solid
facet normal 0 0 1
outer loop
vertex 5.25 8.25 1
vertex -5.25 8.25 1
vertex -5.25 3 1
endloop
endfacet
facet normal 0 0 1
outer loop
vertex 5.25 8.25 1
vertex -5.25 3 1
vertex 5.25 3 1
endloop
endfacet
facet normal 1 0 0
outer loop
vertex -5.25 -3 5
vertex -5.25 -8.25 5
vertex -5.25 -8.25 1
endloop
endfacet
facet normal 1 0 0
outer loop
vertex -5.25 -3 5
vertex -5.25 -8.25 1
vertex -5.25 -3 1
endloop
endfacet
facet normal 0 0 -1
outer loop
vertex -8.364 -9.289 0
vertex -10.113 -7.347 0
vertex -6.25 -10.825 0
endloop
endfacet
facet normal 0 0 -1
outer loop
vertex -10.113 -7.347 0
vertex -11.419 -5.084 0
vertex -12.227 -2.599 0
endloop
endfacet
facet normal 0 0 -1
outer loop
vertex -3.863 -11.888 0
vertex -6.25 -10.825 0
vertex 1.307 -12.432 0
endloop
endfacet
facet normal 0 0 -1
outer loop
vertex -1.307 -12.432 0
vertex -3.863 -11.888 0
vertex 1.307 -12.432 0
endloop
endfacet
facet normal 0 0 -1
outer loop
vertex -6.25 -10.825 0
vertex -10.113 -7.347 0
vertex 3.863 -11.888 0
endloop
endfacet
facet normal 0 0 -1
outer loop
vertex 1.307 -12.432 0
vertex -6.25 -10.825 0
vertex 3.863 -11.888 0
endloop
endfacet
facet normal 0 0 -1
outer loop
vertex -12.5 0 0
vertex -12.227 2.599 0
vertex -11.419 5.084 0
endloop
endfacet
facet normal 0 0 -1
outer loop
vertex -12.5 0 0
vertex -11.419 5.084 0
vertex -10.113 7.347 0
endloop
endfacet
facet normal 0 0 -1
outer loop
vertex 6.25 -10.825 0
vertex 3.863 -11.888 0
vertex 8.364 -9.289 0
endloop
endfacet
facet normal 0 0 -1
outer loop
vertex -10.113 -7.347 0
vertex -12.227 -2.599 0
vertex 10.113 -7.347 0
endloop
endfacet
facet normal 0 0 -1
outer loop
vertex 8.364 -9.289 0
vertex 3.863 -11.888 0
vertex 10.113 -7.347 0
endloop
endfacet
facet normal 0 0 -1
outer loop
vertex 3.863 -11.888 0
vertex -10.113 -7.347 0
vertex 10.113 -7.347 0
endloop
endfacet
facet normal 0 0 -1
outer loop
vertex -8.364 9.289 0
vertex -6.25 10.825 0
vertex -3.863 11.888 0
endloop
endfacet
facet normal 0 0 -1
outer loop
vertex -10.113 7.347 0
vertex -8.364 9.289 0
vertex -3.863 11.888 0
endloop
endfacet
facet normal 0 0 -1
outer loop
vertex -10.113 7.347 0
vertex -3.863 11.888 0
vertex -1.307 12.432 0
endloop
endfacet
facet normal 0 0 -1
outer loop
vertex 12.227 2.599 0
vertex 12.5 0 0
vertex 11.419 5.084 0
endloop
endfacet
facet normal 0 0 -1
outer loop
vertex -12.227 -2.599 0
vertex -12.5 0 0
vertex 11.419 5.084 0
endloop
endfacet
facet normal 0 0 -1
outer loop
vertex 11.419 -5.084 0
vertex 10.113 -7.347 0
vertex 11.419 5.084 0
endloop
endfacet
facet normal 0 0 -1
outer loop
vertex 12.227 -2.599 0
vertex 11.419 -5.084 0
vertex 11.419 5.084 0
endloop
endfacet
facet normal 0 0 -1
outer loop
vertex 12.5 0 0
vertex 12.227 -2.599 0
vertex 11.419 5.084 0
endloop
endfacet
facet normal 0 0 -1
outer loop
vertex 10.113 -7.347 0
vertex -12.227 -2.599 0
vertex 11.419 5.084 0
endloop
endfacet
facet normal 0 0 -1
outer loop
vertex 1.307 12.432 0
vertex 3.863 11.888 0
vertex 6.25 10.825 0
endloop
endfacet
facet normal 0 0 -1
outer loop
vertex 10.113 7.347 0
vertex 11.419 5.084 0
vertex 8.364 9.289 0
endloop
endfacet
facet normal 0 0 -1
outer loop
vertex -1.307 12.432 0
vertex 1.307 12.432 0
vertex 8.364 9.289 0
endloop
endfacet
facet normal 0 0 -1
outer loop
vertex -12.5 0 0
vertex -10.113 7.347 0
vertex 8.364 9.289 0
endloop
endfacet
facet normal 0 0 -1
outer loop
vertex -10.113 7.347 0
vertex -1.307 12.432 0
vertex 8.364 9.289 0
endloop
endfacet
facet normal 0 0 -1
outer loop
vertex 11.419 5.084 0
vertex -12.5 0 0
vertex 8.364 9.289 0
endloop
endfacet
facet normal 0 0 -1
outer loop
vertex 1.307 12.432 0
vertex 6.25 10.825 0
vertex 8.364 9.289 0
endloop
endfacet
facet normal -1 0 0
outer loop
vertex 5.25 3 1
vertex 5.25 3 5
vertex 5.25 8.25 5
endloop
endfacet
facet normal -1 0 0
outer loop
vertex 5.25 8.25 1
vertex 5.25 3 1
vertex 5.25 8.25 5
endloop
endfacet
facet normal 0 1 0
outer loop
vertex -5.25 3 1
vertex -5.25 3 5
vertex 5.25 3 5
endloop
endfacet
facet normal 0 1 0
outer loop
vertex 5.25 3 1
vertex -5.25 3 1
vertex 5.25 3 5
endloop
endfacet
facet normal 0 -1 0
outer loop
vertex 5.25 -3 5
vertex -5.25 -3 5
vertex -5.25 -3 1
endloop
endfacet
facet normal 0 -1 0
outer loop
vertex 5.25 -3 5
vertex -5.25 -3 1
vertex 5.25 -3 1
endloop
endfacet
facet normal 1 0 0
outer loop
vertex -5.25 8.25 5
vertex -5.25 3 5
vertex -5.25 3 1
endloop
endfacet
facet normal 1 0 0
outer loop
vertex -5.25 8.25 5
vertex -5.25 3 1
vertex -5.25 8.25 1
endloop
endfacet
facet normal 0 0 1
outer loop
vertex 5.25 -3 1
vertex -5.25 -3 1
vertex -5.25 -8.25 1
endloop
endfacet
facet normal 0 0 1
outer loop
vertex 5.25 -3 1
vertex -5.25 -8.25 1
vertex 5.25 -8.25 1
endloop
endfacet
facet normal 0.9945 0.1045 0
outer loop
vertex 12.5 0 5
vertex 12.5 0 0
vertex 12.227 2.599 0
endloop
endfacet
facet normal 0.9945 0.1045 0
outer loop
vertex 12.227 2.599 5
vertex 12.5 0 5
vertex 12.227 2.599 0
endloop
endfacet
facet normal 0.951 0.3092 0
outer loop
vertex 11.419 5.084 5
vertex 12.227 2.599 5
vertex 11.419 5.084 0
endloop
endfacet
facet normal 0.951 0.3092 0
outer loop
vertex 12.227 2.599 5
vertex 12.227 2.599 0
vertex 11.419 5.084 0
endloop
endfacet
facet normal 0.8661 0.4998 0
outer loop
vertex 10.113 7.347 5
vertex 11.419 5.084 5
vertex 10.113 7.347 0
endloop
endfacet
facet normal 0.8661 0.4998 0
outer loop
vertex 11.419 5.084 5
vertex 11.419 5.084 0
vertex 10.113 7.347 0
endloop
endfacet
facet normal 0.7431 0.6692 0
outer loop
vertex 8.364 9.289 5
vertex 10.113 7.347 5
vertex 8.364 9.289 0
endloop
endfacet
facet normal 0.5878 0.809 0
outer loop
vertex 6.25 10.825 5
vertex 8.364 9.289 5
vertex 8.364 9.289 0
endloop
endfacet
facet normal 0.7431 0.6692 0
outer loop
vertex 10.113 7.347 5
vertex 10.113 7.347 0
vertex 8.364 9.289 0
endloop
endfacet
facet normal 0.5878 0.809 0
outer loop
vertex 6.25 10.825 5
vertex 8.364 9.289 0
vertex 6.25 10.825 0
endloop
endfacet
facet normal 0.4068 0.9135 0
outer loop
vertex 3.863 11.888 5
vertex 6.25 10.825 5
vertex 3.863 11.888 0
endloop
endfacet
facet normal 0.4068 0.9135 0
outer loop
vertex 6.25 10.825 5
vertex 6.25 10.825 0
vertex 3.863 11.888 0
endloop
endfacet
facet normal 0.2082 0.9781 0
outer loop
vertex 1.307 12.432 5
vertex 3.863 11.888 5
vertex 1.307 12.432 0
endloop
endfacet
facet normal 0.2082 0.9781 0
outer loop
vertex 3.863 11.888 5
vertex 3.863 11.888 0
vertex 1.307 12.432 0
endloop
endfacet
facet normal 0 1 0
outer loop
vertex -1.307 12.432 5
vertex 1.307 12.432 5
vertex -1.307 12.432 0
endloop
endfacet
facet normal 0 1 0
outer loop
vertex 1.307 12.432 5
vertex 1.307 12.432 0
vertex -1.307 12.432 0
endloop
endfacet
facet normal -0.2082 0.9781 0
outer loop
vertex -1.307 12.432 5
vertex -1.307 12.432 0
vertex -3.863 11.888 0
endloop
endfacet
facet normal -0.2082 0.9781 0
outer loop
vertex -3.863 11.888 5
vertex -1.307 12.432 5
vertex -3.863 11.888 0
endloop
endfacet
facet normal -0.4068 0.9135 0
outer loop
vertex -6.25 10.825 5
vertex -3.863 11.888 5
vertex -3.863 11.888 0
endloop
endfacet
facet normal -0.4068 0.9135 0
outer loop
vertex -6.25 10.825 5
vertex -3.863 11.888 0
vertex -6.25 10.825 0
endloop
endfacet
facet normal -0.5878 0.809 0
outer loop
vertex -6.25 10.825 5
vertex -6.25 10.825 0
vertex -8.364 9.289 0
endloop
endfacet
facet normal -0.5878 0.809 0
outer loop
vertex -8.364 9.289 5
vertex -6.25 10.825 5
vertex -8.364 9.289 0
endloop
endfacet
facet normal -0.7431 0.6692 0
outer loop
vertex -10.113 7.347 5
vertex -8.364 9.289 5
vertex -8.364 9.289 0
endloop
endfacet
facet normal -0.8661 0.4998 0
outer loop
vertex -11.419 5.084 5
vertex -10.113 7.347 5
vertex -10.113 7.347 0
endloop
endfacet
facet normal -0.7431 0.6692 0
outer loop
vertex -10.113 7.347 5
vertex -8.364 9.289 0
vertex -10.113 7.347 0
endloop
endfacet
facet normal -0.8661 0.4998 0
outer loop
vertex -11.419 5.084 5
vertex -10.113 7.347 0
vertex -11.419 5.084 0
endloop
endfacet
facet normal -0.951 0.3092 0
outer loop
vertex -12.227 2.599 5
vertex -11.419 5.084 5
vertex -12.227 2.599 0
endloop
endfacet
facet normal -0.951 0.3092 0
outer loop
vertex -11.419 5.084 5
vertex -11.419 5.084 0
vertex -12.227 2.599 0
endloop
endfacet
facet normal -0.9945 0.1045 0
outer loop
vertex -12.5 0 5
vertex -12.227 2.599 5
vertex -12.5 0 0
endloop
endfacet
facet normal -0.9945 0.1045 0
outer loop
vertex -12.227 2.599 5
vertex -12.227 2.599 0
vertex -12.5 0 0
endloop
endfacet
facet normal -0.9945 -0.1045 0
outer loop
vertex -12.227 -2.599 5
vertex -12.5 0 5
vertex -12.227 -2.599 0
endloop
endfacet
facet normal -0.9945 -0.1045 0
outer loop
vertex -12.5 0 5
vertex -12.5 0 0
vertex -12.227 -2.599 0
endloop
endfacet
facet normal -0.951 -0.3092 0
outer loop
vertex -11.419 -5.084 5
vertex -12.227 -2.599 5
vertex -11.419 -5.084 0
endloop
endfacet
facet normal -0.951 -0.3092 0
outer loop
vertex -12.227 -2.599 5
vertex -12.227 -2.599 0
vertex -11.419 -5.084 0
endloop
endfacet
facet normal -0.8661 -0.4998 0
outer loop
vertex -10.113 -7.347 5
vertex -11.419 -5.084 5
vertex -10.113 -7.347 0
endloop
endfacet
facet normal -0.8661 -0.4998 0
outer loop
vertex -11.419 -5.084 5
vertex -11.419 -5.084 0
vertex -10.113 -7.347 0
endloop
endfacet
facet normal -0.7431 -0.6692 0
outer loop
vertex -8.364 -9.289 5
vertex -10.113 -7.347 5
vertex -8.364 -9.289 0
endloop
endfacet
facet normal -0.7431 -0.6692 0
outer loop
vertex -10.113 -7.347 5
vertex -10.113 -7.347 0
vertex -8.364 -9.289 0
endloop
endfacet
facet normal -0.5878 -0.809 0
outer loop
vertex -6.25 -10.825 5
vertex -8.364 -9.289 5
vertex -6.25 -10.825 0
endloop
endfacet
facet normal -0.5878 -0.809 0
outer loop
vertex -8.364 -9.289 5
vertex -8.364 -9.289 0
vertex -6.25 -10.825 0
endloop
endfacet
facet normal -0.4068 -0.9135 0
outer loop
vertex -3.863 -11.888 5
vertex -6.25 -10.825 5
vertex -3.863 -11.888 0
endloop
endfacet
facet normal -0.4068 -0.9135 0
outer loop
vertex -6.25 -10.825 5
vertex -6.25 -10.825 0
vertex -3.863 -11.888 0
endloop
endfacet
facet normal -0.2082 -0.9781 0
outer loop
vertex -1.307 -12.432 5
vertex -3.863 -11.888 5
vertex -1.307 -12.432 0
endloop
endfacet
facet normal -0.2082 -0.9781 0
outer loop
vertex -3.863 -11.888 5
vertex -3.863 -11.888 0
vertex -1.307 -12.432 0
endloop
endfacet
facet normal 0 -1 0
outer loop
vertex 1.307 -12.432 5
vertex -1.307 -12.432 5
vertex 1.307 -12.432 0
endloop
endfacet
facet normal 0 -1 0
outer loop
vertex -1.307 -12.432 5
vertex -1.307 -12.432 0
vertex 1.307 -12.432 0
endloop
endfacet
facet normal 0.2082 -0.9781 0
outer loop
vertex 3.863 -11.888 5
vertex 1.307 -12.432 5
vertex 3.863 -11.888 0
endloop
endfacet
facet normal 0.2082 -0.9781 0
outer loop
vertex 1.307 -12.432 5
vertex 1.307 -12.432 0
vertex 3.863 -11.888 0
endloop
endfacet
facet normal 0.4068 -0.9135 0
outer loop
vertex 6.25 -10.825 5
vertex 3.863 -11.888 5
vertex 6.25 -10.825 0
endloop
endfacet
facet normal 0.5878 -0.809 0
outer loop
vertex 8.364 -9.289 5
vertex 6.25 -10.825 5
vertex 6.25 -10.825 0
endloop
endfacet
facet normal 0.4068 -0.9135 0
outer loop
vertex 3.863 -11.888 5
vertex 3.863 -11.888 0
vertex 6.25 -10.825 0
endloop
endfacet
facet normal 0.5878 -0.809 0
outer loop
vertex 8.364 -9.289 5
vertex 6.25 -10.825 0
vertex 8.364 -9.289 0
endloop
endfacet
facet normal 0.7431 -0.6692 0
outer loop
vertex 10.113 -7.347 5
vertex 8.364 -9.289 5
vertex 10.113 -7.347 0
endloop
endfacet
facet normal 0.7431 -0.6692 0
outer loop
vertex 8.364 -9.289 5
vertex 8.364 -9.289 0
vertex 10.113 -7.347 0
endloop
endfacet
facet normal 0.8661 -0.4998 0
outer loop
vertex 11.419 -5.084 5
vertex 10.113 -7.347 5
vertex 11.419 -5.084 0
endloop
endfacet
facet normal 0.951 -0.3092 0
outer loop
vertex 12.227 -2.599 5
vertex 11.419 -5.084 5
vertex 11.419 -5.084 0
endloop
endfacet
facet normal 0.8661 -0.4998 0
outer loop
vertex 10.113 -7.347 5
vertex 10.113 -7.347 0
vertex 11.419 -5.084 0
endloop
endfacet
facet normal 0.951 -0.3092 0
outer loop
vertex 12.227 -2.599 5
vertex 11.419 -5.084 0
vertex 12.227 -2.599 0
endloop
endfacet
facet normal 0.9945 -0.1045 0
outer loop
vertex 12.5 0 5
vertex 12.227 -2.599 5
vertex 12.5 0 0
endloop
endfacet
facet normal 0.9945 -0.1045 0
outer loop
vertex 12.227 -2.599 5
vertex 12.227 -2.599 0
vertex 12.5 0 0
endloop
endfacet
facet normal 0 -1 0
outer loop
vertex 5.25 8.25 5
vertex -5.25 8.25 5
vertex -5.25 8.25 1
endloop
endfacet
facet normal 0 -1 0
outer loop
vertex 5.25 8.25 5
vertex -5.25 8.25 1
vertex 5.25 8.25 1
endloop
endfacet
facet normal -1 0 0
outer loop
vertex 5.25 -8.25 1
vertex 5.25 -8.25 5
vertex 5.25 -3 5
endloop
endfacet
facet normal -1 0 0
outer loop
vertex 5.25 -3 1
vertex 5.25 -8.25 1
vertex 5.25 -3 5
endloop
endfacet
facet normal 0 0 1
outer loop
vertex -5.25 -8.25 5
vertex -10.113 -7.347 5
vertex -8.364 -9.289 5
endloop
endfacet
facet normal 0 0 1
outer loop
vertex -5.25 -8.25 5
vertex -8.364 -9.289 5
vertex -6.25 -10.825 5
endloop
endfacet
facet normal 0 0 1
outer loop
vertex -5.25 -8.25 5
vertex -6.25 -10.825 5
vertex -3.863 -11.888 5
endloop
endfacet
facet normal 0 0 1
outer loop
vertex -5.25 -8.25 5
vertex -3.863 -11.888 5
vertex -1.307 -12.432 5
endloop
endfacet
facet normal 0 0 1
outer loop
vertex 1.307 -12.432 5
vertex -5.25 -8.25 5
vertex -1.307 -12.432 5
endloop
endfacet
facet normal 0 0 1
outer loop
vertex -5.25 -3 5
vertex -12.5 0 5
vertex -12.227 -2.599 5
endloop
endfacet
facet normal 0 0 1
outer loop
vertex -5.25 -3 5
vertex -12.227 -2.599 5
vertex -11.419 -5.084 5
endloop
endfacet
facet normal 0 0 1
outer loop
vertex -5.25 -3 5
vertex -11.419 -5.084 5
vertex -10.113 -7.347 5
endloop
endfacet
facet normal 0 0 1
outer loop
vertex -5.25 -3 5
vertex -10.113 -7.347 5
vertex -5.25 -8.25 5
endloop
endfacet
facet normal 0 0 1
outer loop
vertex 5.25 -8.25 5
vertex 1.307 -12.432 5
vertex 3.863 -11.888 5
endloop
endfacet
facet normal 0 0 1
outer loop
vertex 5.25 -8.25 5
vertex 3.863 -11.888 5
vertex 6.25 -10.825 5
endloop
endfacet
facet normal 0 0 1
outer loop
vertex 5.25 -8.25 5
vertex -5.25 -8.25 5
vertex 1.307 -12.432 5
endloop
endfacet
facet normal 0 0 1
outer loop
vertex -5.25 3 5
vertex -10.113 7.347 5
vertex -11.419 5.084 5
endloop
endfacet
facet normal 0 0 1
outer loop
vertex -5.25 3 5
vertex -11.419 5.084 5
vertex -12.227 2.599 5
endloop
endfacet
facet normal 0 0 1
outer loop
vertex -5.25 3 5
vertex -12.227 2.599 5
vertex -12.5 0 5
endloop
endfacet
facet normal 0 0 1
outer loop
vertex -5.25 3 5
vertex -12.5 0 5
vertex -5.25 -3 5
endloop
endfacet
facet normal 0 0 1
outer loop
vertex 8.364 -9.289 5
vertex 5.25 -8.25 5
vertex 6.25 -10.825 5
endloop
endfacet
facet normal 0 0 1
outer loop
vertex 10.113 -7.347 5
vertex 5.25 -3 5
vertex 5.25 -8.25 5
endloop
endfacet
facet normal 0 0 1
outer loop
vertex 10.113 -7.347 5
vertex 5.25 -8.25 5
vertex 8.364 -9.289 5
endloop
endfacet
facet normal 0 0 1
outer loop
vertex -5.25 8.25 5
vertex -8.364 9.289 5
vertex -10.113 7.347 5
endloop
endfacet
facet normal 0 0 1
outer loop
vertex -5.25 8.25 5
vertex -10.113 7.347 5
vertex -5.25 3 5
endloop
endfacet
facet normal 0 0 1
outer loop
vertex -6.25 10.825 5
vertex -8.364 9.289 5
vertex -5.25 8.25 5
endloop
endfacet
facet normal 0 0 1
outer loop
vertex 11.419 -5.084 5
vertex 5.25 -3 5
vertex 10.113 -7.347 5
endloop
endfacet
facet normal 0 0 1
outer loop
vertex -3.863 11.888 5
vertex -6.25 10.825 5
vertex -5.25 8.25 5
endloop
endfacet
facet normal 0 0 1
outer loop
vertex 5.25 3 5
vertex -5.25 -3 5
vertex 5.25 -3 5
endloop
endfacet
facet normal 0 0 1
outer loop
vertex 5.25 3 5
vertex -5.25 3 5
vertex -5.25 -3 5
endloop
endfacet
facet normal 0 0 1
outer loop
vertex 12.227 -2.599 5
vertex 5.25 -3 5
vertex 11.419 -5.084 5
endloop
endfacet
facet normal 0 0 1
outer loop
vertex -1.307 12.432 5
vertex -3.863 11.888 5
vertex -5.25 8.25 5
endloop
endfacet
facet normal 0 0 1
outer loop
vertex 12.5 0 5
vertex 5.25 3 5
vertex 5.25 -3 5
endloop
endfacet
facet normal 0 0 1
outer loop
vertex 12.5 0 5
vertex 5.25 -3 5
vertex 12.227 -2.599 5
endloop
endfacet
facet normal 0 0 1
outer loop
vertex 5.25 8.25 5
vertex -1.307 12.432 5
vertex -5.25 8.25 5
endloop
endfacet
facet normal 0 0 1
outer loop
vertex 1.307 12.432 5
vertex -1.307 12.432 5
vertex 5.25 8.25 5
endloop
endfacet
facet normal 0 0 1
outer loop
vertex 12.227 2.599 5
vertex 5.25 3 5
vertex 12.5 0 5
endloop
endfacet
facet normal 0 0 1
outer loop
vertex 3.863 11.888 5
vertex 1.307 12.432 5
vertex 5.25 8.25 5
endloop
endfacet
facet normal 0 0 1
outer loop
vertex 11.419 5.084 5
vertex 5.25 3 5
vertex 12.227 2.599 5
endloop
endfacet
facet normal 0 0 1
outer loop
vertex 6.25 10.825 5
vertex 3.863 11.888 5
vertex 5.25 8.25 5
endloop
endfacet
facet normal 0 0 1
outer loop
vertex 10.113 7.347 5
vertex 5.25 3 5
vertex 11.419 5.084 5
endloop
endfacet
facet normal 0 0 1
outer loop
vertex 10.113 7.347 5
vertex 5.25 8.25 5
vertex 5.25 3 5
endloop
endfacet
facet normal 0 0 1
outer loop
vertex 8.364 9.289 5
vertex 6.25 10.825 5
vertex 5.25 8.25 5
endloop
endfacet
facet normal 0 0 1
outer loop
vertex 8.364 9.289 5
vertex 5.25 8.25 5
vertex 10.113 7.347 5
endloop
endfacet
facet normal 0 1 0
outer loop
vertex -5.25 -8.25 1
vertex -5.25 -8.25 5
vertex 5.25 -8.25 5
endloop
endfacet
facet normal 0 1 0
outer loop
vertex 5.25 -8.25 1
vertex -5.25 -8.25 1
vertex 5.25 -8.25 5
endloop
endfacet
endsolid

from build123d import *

# Parameters (mm, degrees)
F0_R     = 12.5
F1_DEPTH = 5
F2_W     = 10.5
F2_H     = 5.25
F3_DEPTH = 4


with BuildPart() as f1:
    # F0 (on Top) → F1 (new body)
    with BuildSketch(Plane.XY):
        Circle(F0_R)
    extrude(amount=F1_DEPTH)


with BuildPart() as f3:
    # F2 (on face) → F3 (new body)
    with BuildSketch(Plane.XY.offset(5)):
        with Locations((0, 5.625)):
            Rectangle(F2_W, F2_H)
        with Locations((0, -5.625)):
            Rectangle(F2_W, F2_H)
    extrude(amount=-F3_DEPTH)


with BuildPart() as f1_1:
    add(f1.part)

    # F4: cut F3
    add(f3.part, mode=Mode.SUBTRACT)


solid = f1_1.part
